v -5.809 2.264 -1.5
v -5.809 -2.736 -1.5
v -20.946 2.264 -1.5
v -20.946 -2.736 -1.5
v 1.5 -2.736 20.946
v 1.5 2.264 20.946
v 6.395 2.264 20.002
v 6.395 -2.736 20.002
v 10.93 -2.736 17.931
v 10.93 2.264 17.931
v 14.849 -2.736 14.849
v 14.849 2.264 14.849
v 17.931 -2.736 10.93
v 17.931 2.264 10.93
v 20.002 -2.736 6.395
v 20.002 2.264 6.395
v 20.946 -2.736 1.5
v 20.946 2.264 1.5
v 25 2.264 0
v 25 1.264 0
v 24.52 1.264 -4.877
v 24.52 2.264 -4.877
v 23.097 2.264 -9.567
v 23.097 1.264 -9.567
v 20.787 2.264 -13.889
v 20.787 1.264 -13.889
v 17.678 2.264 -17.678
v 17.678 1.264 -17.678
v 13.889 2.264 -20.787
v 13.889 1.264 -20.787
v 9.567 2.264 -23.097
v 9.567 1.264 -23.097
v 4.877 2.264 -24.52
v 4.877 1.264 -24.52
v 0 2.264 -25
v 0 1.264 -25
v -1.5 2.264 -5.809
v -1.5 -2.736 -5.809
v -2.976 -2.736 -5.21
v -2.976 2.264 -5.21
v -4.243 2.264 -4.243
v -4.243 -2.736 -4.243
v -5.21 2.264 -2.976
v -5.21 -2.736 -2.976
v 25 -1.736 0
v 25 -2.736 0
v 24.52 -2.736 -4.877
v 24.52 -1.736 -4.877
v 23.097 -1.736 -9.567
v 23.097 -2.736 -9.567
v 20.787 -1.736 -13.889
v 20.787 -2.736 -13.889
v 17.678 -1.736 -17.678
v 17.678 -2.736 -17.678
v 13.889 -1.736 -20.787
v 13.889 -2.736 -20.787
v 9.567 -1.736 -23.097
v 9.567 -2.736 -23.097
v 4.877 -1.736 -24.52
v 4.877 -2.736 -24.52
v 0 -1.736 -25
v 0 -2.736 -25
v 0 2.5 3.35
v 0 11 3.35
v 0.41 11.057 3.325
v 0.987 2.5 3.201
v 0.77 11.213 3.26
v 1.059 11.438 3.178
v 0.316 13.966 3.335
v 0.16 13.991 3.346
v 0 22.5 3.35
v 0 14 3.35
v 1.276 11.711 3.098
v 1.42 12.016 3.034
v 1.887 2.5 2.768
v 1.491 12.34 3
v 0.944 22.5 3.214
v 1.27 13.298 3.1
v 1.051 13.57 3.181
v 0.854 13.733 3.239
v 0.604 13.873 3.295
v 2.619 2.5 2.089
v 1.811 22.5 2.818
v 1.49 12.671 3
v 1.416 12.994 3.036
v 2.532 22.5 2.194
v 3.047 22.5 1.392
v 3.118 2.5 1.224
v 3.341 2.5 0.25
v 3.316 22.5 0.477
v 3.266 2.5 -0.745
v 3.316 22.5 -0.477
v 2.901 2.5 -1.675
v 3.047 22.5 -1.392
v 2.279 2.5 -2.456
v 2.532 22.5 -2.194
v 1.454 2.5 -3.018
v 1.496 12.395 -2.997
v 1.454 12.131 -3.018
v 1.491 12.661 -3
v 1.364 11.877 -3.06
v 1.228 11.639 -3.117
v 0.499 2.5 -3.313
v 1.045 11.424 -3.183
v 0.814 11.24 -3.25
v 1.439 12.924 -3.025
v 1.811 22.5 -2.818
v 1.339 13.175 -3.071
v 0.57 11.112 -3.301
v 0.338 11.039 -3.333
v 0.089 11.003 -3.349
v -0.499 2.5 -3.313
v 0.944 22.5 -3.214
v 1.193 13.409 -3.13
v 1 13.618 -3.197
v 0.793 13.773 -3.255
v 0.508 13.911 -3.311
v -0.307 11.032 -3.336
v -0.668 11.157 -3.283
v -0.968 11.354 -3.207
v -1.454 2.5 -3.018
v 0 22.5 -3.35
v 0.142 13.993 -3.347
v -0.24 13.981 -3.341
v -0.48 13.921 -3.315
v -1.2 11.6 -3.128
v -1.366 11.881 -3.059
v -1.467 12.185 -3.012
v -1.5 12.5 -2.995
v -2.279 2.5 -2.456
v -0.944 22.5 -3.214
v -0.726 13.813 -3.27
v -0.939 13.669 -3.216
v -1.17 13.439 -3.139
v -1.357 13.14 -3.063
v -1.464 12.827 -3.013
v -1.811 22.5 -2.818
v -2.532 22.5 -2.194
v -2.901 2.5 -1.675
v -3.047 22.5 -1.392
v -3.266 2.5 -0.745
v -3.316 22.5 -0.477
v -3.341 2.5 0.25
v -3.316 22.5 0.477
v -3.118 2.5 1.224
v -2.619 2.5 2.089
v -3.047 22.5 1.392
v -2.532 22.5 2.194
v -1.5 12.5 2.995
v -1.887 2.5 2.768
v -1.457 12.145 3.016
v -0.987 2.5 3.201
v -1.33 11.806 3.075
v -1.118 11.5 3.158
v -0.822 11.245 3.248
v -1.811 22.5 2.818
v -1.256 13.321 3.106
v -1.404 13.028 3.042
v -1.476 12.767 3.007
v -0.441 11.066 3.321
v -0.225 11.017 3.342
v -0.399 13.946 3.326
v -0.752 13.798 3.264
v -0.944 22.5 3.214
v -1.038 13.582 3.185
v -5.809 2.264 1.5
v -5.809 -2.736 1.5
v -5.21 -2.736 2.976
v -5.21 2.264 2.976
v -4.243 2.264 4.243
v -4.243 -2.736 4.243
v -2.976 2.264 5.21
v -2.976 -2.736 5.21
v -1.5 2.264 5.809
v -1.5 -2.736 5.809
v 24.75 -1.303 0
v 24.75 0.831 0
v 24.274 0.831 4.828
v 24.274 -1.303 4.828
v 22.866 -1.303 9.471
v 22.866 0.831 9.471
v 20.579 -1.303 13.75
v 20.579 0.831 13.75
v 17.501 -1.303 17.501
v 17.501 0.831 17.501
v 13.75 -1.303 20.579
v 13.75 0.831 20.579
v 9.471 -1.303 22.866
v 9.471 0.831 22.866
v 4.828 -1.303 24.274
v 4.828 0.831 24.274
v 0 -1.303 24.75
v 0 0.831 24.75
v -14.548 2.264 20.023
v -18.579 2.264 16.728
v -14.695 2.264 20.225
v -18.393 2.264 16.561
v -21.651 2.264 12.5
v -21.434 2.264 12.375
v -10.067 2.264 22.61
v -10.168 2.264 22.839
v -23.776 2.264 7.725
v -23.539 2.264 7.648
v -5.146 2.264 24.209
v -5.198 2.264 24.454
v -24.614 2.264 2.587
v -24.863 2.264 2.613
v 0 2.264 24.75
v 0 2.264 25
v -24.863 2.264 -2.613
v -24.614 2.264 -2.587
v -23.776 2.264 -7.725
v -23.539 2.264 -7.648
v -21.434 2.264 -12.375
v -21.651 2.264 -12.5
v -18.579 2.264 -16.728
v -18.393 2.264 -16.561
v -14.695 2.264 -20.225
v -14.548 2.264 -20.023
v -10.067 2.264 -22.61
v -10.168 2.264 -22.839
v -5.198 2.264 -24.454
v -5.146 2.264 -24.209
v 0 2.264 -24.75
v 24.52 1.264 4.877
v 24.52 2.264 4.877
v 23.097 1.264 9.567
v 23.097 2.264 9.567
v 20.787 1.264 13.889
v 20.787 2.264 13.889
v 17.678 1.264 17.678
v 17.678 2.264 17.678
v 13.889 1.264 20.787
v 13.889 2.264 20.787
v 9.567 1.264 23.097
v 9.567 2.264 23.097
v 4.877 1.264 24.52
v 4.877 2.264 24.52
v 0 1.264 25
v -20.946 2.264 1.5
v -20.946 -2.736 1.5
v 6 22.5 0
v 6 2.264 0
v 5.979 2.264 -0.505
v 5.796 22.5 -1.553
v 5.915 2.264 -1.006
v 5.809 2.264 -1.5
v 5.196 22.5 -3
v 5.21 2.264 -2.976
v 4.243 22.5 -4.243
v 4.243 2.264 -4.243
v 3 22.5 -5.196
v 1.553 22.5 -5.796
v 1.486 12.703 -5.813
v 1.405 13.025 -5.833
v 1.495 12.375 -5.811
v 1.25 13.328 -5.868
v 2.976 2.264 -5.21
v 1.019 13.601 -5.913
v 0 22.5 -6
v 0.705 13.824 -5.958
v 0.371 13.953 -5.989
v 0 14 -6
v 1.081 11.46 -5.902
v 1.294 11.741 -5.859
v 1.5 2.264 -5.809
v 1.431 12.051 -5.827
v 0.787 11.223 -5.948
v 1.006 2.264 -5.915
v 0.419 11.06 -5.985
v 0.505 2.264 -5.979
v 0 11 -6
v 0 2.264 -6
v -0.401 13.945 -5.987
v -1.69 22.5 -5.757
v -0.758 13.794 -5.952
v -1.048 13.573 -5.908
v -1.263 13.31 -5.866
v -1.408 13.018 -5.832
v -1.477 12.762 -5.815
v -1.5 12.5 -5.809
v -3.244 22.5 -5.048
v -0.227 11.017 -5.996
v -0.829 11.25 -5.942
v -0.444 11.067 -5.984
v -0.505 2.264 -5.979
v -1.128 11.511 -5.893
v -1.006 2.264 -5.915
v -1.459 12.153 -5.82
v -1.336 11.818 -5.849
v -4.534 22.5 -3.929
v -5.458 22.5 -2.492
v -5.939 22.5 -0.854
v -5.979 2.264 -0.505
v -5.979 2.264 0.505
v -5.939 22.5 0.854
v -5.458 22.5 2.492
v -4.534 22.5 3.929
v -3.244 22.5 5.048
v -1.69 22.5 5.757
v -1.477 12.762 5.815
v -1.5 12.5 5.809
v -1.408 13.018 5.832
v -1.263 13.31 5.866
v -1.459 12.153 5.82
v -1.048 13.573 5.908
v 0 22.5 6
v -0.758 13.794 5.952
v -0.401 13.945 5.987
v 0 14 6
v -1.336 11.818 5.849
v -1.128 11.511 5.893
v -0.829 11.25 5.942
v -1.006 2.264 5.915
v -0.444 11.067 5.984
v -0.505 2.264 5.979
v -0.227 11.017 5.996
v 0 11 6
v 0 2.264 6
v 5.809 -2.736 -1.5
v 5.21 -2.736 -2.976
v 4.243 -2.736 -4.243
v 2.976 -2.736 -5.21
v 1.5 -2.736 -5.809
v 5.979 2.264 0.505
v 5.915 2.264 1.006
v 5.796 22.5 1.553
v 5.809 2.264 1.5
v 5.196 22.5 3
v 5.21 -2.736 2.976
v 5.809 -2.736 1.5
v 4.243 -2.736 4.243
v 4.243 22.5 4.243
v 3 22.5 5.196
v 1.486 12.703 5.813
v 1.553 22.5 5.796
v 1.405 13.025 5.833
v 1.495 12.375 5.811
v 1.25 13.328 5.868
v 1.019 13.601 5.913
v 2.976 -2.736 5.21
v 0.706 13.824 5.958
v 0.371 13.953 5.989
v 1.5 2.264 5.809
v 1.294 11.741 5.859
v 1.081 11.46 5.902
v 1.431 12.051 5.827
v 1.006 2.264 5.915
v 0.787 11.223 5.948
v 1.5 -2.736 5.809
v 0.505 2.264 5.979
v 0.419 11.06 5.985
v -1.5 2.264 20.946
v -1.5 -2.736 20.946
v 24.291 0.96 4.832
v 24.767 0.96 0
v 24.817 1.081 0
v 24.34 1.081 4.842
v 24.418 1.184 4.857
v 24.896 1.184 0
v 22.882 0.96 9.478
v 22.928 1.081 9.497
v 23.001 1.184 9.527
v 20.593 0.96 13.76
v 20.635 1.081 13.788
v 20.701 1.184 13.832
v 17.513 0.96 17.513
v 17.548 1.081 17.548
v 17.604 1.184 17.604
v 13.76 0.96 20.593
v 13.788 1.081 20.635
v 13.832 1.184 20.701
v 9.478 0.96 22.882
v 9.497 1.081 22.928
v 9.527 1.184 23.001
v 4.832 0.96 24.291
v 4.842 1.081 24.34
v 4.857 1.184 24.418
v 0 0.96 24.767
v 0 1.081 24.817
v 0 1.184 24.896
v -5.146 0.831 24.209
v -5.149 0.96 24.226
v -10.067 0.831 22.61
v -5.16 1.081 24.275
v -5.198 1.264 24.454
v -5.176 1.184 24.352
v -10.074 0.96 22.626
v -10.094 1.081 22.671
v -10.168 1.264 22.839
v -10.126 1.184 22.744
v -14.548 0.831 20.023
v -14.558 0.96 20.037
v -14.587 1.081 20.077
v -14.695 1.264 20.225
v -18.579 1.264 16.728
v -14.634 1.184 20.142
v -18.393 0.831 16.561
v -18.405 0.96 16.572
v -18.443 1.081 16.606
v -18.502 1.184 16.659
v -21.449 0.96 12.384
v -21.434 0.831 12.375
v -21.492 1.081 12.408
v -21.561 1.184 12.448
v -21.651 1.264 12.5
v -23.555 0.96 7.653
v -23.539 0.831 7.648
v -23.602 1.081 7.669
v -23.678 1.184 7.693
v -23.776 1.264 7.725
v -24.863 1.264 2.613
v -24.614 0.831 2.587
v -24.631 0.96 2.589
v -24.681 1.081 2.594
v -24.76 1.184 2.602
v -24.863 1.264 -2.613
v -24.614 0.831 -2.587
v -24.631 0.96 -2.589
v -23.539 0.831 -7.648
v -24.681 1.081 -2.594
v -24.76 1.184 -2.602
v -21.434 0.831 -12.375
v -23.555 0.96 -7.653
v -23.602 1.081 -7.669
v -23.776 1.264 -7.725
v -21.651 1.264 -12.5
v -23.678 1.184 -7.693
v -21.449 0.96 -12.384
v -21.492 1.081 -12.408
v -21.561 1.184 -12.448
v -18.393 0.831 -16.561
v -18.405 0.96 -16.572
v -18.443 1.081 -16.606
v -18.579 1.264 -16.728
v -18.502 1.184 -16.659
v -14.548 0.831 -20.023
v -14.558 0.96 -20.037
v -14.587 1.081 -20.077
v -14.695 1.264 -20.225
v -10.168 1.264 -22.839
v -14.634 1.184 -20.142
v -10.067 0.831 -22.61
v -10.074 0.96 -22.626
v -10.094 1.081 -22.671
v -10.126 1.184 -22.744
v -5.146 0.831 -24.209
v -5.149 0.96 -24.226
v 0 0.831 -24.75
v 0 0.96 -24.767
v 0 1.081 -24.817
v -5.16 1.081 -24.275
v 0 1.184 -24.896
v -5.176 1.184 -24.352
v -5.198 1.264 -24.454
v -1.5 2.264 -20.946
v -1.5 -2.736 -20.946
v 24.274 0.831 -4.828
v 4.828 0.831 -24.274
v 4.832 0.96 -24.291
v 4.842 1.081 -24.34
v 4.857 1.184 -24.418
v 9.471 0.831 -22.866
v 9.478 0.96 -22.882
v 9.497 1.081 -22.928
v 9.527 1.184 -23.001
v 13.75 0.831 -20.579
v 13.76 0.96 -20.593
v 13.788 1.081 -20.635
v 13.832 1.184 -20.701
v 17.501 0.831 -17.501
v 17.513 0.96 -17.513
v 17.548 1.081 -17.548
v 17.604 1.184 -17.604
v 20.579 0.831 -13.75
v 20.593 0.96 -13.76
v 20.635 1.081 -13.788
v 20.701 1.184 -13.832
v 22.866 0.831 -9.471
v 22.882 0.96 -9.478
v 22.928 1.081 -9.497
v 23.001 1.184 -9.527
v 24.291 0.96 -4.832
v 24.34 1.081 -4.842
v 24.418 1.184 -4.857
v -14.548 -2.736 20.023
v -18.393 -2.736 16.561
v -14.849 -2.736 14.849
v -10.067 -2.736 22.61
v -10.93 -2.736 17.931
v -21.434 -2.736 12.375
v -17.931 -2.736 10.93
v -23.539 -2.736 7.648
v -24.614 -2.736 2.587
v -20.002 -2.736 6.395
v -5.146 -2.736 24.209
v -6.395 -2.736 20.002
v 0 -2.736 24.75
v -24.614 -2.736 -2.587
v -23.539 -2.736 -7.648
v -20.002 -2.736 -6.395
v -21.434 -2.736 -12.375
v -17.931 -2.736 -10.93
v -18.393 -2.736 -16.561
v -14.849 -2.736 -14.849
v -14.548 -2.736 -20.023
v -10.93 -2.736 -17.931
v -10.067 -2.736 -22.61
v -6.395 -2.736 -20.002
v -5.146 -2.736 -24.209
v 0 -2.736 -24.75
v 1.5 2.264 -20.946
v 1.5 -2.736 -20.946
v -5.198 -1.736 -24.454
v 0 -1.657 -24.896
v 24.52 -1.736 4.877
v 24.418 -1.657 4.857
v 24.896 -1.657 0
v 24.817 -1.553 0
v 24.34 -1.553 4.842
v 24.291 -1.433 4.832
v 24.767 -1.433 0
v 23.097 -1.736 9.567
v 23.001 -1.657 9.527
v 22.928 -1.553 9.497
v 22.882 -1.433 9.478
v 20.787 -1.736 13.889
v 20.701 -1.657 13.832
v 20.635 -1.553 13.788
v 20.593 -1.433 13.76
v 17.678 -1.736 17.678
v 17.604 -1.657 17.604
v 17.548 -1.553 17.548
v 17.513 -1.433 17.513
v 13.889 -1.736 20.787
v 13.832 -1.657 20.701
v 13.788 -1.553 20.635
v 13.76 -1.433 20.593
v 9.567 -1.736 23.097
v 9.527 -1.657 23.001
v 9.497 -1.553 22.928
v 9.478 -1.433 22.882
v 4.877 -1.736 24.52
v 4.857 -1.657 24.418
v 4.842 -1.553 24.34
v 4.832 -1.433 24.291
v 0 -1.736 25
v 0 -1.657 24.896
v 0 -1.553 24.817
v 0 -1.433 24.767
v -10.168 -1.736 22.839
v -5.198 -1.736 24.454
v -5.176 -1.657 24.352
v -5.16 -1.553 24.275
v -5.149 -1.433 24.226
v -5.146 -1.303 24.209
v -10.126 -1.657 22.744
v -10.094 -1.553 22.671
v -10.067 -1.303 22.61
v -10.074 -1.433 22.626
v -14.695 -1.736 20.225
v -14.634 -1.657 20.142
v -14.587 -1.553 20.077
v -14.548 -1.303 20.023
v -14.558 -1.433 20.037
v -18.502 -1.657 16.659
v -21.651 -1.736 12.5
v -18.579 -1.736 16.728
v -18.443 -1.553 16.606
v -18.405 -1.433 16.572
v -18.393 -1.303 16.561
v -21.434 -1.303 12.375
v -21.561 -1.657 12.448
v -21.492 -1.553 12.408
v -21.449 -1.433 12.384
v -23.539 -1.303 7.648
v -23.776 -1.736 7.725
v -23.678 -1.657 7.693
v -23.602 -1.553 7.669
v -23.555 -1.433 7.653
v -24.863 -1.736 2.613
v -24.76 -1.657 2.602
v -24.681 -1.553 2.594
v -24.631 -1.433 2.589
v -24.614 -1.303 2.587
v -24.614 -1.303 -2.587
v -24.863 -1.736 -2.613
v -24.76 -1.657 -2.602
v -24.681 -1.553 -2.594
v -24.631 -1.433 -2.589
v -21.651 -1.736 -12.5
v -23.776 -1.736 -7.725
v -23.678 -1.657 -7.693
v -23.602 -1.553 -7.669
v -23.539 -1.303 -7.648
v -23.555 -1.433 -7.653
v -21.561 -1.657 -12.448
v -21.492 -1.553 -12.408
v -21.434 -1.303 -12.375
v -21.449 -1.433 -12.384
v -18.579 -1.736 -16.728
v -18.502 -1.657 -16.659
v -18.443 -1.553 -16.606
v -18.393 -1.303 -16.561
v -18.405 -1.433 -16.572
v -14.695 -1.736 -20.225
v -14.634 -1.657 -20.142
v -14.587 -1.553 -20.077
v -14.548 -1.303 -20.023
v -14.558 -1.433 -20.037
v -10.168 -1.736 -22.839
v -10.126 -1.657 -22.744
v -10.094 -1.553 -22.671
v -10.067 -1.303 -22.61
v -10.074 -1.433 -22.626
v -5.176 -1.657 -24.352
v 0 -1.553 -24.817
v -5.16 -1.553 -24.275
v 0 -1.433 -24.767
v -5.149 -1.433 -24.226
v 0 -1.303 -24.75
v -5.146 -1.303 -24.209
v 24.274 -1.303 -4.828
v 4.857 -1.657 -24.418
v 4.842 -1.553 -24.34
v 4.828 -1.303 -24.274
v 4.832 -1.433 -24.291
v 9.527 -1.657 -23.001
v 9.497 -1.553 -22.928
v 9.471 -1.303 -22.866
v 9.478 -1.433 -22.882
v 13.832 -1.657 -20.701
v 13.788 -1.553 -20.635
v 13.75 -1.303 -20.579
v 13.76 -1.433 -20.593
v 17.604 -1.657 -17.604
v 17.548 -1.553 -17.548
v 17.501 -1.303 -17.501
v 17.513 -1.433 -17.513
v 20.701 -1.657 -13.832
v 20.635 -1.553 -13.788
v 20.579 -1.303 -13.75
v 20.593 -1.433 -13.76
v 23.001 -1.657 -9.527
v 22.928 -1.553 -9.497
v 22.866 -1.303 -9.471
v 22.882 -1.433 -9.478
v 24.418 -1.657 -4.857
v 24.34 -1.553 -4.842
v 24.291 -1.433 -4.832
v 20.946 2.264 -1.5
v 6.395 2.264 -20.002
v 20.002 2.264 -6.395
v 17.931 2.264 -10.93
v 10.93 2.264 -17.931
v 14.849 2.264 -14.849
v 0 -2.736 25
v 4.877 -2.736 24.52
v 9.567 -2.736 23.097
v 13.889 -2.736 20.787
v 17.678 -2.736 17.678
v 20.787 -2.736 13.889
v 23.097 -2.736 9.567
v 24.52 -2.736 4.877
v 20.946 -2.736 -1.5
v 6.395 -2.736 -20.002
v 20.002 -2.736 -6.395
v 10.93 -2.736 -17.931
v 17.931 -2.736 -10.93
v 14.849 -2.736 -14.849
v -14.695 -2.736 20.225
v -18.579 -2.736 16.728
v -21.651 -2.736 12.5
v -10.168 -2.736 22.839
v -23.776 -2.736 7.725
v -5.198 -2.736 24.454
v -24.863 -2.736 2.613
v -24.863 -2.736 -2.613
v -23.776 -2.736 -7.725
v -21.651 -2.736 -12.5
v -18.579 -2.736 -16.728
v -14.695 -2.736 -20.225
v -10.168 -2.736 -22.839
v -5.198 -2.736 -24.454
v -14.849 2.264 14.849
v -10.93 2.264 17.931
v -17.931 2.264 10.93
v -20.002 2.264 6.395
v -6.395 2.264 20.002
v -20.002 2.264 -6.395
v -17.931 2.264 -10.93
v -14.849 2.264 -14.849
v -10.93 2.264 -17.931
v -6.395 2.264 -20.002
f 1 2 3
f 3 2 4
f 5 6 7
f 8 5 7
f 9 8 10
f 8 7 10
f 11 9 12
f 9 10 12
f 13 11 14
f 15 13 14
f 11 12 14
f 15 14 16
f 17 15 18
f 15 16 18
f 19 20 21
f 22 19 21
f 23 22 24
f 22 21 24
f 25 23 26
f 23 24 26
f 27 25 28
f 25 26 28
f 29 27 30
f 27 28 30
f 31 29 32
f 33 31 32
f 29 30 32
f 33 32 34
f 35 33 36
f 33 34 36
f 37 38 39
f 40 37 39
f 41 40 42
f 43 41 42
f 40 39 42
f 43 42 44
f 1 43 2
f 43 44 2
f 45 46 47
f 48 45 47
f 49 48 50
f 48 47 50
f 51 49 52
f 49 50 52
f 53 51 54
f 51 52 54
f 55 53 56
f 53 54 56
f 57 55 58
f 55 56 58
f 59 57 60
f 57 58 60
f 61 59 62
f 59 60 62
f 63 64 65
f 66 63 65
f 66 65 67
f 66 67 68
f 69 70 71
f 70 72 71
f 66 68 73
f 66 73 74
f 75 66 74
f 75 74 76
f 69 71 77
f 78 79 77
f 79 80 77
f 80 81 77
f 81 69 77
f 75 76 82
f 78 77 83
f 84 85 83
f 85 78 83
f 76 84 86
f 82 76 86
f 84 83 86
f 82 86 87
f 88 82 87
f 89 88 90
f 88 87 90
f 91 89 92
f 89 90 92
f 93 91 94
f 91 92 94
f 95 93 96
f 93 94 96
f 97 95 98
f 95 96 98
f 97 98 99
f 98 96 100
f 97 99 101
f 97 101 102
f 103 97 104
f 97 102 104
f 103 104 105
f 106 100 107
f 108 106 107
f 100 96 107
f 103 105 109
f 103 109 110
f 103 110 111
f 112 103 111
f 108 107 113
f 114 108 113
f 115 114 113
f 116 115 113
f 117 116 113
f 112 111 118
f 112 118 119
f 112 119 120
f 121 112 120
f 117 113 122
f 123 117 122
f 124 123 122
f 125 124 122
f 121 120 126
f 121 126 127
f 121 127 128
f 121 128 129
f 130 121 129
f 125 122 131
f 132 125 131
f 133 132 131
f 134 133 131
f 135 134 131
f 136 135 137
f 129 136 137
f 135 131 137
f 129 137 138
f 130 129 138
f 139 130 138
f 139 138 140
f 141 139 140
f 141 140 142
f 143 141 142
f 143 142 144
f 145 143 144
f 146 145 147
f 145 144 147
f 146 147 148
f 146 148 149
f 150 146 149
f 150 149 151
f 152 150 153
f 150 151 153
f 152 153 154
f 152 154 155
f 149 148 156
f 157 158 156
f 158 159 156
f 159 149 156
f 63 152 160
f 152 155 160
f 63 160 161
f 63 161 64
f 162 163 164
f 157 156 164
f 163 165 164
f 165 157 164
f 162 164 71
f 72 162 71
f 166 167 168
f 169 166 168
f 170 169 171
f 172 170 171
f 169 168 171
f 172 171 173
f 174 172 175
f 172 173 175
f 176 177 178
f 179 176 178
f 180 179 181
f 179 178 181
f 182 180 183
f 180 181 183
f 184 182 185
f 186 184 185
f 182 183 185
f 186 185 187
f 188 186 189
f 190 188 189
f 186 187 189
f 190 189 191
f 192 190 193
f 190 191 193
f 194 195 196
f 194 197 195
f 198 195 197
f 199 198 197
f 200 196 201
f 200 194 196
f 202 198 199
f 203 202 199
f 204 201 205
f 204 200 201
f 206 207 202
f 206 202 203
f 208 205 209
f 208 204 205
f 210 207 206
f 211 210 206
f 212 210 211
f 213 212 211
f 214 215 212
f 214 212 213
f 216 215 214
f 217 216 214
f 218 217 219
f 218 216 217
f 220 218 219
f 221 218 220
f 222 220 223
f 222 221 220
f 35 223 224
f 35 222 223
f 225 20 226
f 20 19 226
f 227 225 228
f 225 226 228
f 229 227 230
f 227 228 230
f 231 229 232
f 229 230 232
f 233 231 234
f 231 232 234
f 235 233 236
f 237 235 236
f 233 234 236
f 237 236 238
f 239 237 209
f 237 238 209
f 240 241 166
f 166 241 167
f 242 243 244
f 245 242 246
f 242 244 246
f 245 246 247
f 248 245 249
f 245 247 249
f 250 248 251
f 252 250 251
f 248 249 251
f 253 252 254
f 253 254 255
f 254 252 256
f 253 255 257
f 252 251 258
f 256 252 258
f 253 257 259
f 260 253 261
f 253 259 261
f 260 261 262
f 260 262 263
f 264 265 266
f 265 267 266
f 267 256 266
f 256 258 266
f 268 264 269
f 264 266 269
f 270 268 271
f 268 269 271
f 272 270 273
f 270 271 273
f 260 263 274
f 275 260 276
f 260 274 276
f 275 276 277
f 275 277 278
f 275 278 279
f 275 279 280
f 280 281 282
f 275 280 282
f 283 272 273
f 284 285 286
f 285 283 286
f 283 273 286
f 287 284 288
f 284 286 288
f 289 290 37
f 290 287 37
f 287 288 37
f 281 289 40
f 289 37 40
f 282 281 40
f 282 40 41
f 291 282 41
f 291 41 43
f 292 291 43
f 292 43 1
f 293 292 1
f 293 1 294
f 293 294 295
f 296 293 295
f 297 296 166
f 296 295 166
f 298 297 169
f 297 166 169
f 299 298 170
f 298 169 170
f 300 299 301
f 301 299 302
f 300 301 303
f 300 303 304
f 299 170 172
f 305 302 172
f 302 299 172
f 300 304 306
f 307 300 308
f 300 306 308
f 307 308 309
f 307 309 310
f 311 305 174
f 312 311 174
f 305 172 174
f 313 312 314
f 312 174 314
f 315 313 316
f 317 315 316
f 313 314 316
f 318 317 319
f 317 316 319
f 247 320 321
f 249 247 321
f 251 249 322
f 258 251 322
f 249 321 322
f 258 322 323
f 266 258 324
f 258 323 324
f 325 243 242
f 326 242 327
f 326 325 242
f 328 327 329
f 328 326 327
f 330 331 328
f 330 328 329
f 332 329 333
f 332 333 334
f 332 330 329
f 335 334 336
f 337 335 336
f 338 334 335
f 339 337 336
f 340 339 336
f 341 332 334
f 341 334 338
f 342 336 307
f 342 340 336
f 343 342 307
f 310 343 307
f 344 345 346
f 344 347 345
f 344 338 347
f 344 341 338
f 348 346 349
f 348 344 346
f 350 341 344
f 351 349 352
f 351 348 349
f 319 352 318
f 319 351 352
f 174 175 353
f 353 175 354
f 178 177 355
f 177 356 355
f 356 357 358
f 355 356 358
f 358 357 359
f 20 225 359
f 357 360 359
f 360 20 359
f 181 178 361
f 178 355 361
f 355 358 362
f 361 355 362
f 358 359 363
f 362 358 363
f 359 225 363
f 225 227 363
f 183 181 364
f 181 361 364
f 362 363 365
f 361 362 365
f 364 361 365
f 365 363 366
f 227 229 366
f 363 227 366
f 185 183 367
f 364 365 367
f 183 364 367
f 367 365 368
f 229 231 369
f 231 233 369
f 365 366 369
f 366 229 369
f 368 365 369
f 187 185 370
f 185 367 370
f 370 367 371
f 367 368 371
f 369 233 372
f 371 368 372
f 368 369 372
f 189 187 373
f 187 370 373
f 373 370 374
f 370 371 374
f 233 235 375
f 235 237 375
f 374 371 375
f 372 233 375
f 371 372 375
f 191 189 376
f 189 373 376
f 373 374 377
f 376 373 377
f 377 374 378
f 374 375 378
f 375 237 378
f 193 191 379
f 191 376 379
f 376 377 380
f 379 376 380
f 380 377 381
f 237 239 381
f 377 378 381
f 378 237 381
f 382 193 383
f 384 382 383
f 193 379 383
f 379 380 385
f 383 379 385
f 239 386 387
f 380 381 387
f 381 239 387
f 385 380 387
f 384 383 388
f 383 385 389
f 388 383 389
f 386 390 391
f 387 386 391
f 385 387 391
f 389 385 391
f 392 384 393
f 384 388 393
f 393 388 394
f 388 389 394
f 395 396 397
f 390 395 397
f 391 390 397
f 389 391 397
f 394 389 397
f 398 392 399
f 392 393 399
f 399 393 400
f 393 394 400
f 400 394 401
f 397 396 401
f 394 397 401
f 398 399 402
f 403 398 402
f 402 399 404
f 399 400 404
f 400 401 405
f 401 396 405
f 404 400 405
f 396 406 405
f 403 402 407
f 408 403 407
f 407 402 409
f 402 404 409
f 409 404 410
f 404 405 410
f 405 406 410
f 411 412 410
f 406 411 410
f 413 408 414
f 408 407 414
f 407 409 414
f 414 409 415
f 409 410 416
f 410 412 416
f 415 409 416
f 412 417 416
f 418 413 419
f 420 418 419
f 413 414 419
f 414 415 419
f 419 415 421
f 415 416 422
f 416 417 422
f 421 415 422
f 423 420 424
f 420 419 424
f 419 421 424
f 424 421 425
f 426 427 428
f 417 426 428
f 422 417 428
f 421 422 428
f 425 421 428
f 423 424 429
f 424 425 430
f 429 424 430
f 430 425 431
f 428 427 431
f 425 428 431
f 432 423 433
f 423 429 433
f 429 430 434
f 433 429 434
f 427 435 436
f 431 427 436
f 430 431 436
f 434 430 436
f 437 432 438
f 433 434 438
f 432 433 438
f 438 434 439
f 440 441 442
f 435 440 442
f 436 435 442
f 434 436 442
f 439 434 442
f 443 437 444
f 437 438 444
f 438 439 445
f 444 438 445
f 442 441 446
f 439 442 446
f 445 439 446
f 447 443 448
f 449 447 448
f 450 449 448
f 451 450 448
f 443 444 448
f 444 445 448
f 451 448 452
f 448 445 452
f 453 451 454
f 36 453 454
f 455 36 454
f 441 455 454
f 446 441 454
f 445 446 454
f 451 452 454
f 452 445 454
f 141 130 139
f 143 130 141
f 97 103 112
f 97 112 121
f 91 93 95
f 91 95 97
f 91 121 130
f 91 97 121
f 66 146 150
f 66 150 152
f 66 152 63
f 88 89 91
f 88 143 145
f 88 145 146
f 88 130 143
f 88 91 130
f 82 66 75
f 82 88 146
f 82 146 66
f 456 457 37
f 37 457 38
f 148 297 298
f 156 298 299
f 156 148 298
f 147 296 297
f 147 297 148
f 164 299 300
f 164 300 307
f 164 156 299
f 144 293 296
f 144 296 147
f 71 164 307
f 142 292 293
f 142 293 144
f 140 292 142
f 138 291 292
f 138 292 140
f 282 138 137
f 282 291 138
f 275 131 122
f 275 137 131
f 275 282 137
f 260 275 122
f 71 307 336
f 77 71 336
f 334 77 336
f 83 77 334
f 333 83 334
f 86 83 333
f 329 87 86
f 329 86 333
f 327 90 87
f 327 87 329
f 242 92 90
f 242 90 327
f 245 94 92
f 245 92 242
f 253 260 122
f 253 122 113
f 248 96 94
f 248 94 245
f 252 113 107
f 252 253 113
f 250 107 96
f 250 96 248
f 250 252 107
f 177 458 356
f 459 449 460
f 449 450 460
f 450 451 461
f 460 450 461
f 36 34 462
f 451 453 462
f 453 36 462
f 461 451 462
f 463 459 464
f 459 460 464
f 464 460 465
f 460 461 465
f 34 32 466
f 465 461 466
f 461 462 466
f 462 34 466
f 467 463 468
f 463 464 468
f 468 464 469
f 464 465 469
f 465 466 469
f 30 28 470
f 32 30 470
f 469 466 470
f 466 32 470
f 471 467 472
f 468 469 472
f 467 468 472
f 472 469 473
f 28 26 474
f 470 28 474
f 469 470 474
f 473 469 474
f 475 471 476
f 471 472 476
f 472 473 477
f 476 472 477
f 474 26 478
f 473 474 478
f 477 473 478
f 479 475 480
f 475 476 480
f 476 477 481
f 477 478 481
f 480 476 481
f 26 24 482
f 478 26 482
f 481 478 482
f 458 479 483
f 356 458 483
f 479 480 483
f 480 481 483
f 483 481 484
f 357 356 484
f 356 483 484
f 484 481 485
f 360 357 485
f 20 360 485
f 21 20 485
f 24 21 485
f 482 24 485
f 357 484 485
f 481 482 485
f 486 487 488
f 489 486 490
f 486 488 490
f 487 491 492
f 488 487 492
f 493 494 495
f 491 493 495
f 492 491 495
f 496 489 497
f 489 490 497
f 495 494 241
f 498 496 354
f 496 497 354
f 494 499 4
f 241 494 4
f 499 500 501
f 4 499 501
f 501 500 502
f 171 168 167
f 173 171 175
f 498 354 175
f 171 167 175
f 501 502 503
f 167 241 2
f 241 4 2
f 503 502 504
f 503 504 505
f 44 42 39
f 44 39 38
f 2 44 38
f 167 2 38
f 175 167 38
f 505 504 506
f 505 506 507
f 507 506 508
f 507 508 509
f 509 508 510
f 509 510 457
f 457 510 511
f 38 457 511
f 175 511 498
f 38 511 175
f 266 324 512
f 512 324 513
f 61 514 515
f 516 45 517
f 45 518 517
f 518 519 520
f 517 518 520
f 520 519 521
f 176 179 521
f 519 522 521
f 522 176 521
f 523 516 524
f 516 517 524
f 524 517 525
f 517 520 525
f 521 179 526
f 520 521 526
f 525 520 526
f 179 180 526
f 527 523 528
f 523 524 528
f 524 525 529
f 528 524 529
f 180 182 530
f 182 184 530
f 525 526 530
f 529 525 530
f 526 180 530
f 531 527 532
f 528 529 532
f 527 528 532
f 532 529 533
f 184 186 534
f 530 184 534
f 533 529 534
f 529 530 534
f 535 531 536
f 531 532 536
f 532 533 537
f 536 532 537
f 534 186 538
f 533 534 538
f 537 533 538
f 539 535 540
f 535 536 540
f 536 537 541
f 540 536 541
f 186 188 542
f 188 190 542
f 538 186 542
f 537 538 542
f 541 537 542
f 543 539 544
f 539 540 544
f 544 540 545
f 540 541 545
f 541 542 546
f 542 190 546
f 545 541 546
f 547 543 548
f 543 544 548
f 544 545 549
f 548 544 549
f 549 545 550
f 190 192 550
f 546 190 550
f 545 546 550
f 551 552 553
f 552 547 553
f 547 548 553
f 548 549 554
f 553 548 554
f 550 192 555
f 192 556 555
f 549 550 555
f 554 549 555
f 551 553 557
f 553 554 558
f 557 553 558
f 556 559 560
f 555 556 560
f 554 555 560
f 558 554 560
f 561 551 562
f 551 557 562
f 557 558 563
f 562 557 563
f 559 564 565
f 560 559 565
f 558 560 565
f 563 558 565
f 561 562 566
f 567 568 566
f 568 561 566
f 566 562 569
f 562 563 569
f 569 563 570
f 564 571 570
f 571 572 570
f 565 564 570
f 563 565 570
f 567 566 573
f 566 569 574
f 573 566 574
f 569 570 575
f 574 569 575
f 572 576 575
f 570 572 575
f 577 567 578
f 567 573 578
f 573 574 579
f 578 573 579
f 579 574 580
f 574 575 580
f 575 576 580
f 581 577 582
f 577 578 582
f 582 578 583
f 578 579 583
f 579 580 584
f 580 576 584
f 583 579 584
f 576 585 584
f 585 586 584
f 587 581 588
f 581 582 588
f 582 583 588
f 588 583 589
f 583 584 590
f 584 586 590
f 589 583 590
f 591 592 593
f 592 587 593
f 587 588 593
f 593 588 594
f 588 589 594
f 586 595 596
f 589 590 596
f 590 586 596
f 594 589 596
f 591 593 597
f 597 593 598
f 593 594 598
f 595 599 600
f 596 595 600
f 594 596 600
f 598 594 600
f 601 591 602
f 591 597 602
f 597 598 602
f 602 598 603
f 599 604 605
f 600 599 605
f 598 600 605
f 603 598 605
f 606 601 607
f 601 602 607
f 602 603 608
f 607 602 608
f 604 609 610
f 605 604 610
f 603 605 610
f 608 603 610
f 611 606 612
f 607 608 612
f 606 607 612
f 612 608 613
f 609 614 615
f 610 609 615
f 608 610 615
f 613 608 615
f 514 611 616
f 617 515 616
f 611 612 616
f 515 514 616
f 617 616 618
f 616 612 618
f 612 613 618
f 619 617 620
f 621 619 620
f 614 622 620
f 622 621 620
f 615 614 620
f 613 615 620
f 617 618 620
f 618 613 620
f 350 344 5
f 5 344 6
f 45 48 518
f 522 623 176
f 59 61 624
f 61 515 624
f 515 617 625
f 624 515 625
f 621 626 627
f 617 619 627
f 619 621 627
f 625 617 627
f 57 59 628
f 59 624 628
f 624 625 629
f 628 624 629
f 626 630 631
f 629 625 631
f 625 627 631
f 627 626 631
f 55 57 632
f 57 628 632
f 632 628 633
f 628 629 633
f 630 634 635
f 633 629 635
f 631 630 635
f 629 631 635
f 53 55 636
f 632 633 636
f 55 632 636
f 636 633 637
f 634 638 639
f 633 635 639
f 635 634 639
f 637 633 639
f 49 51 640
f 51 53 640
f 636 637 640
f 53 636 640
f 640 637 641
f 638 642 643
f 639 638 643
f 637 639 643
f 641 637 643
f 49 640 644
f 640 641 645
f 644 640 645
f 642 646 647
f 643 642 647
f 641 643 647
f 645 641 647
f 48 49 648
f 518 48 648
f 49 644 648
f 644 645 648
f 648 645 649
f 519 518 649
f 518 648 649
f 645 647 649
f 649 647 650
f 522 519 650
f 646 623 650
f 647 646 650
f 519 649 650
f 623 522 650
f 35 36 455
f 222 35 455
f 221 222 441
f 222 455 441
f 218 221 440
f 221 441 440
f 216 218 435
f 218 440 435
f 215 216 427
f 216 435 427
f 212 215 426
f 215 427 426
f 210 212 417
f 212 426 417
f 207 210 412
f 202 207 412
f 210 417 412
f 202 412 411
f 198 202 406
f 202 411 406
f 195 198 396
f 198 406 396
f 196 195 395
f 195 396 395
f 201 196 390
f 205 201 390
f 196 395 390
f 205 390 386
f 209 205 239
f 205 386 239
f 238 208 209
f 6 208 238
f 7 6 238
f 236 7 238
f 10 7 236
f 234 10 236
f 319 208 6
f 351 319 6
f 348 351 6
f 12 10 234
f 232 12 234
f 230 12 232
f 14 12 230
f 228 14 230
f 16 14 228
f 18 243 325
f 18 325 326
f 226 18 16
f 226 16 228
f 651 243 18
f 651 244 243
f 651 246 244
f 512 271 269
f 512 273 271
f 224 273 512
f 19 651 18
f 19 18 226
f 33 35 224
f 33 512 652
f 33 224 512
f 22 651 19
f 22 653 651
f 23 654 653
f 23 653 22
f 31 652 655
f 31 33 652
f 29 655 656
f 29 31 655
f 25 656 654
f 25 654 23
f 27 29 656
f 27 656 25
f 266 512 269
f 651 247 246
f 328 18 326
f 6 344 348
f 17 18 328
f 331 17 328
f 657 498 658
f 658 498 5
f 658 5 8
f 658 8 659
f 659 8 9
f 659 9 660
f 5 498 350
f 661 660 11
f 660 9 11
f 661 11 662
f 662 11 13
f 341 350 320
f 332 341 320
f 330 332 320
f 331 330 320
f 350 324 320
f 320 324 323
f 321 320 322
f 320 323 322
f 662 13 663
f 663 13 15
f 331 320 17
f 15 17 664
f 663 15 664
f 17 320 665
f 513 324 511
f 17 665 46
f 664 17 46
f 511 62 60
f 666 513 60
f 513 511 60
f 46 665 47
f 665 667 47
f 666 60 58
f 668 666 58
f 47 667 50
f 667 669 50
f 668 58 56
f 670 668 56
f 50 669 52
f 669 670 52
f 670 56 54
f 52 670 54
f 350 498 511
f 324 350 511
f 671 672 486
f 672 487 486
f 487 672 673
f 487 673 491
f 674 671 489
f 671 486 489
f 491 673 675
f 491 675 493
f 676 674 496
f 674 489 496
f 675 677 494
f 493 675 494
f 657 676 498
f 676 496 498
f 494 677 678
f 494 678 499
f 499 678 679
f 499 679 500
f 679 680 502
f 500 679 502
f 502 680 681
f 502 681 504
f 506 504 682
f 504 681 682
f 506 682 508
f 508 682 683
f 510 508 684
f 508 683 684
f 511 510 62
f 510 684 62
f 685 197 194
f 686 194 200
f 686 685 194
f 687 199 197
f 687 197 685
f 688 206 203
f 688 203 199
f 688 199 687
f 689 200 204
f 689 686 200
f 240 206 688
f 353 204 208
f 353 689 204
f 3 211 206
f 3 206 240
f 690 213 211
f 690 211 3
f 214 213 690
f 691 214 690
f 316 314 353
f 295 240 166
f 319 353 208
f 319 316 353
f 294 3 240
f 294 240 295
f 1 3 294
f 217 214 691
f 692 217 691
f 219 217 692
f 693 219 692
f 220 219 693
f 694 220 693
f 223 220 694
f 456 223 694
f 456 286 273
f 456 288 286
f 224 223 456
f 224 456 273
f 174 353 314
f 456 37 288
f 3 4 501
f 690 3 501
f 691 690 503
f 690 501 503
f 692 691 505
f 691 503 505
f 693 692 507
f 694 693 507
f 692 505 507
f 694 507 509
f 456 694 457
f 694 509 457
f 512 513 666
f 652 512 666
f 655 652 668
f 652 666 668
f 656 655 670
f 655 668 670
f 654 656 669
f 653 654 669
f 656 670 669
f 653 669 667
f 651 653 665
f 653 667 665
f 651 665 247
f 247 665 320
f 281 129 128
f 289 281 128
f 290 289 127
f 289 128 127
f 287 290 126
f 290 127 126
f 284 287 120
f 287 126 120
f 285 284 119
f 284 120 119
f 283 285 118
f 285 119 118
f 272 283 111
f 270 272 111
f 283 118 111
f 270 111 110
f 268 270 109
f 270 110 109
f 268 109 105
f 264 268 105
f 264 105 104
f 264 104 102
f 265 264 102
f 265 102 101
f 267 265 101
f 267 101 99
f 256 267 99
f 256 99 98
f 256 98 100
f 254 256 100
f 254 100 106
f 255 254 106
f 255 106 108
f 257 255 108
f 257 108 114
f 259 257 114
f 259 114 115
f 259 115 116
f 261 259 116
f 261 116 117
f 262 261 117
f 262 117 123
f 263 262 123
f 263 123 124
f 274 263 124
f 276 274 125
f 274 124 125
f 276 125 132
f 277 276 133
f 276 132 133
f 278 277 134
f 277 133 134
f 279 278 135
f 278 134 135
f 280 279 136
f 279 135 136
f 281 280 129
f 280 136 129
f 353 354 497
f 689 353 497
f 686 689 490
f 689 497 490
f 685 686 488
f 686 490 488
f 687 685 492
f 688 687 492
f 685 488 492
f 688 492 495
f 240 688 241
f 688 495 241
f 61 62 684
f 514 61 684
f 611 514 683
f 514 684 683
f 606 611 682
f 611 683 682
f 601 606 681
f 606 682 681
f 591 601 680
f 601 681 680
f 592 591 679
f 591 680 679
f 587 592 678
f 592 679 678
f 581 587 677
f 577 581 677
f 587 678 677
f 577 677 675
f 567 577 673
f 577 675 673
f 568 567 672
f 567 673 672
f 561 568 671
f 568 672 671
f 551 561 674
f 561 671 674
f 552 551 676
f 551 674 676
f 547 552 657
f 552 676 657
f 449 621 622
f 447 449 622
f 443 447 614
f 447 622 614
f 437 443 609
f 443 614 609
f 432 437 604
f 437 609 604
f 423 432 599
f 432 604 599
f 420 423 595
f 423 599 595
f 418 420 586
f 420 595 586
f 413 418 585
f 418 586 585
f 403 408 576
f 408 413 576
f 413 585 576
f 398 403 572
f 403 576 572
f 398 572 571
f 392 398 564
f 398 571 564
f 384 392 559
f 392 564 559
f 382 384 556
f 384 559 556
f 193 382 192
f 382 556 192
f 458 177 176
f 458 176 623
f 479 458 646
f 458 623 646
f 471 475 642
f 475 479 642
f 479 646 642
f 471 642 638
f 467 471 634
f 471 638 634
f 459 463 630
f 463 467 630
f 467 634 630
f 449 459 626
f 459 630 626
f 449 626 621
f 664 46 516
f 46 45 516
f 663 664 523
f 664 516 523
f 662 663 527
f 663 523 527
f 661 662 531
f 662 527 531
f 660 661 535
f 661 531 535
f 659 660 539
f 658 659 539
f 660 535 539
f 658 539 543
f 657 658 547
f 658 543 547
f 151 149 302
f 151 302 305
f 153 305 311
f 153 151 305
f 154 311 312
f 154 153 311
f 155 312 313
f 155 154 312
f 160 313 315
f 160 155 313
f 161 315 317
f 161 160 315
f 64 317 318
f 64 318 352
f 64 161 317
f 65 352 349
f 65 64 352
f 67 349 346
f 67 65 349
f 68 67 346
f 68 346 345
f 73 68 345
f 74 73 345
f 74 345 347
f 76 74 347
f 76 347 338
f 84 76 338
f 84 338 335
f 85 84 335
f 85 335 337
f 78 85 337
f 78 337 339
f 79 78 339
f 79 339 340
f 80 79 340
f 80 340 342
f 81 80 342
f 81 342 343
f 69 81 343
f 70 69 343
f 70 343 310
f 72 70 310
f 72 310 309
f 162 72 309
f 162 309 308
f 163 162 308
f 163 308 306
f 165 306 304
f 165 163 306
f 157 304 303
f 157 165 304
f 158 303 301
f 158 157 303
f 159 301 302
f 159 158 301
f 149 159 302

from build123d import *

# Parameters (mm, degrees)
REVOLVE1_ANGLE                 = 90.0000000000002
BOSS_EXTRUDE2_DEPTH            = 22.5
CUT_EXTRUDE1_DEPTH             = 41.736973886583954
MIRROR3_START                  = -2.736132077
MIRROR3_DEPTH                  = 5
MIRROR3_START_2                = 2.263867923
MIRROR3_2_DEPTH                = 20.236132077
MIRROR3_3_DEPTH                = 1
MIRROR3_START_3                = 1.263867923
MIRROR3_4_DEPTH                = 1
MIRROR4_START                  = -2.736132077
MIRROR4_DEPTH                  = 5
MIRROR4_START_2                = 2.263867923
MIRROR4_2_DEPTH                = 20.236132077
MIRROR4_3_DEPTH                = 1
MIRROR4_START_3                = 1.263867923
MIRROR4_4_DEPTH                = 1
SKETCH7_R                      = 3.35
CUT_EXTRUDE2_DEPTH             = 20
FILLET9_R                      = 0.5
CUT_EXTRUDE3_REACH             = 43.908
SKETCH8_R                      = 1.5000000000000004
CUT_EXTRUDE3_DIRECTION_2_REACH = 43.908


# Read off the part's stored shape, not the designer's step: Mirror3, Mirror4
with BuildPart() as part:
    # Sketch1 → Revolve1 (revolve)
    with BuildSketch(Plane.XY):
        Polygon((0, 2.2638679230386933), (0, -2.7361320769613027), (25, -2.7361320769613027), (25.000000000000007, -1.736132076961303), (24.750000000000007, -1.736132076961303), (24.75, 1.2638679230386973), (25, 1.2638679230386973), (25, 2.2638679230386973), align=None)
    revolve(axis=Axis((0, 2.2638679230386933, 0), (0, -1, 0)), revolution_arc=REVOLVE1_ANGLE)

    # Sketch2 → Boss-Extrude2 (add)
    with BuildSketch(Plane(origin=(0, 0, 0), x_dir=(1, 0, 0), z_dir=(0, 1, 0))):
        with BuildLine():
            Line((0, 0), (6, 0))
            ThreePointArc((6, 0), (4.242640687119239, -4.242640687119332), (-1.3093e-13, -6))
            Line((-1.3093e-13, -6), (0, 0))
        make_face()
    extrude(amount=BOSS_EXTRUDE2_DEPTH)

    # Sketch6 → Cut-Extrude1 (cut, through all)
    with BuildSketch(Plane(origin=(0, 2.263867923038695, 0), x_dir=(1, 0, 0), z_dir=(0, 1, 0))):
        with BuildLine():
            Line((1.4999999999999127, -5.809475019311148), (1.4999999999999145, -20.946360065653423))
            ThreePointArc((1.4999999999999145, -20.946360065653423), (14.849242404917469, -14.849242404917533), (20.946360065653415, -1.5))
            Line((20.946360065653415, -1.5), (5.809475019311125, -1.5))
            ThreePointArc((5.809475019311125, -1.5), (4.242640687119254, -4.242640687119317), (1.4999999999999127, -5.809475019311148))
        make_face()
    extrude(amount=-CUT_EXTRUDE1_DEPTH, mode=Mode.SUBTRACT)

    # Mirror3 outline → Mirror3 (add)
    with BuildSketch(Plane(origin=(0, 0, 0), x_dir=(1, 0, 0), z_dir=(0, 1, 0)).offset(MIRROR3_START)):
        with BuildLine():
            ThreePointArc((24.75, 0), (17.500892834, 17.500892834), (0, 24.75))
            Line((0, 24.75), (0, 0))
            Line((0, 0), (24.75, 0))
        make_face()
        with BuildLine():
            Line((20.946360066, 1.5), (5.809475019, 1.5))
            ThreePointArc((5.809475019, 1.5), (4.242640687, 4.242640687), (1.5, 5.809475019))
            Line((1.5, 5.809475019), (1.5, 20.946360066))
            ThreePointArc((1.5, 20.946360066), (14.849242405, 14.849242405), (20.946360066, 1.5))
        make_face(mode=Mode.SUBTRACT)
    extrude(amount=MIRROR3_DEPTH)

    # Mirror3 2 outline → Mirror3 2 (add)
    with BuildSketch(Plane(origin=(0, 0, 0), x_dir=(1, 0, 0), z_dir=(0, 1, 0)).offset(MIRROR3_START_2)):
        with BuildLine():
            Line((0, 0), (6, 0))
            ThreePointArc((6, 0), (4.242640687, 4.242640687), (0, 6))
            Line((0, 6), (0, 0))
        make_face()
    extrude(amount=MIRROR3_2_DEPTH)

    # Mirror3 3 outline → Mirror3 3 (add)
    with BuildSketch(Plane(origin=(0, 0, 0), x_dir=(1, 0, 0), z_dir=(0, 1, 0)).offset(MIRROR3_START)):
        with BuildLine():
            Line((24.75, 0), (25, 0))
            ThreePointArc((25, 0), (17.67766953, 17.67766953), (0, 25))
            Line((0, 25), (0, 24.75))
            ThreePointArc((0, 24.75), (17.500892834, 17.500892834), (24.75, 0))
        make_face()
    extrude(amount=MIRROR3_3_DEPTH)

    # Mirror3 4 outline → Mirror3 4 (add)
    with BuildSketch(Plane(origin=(0, 0, 0), x_dir=(1, 0, 0), z_dir=(0, 1, 0)).offset(MIRROR3_START_3)):
        with BuildLine():
            Line((24.75, 0), (25, 0))
            ThreePointArc((25, 0), (17.67766953, 17.67766953), (0, 25))
            Line((0, 25), (0, 24.75))
            ThreePointArc((0, 24.75), (17.500892834, 17.500892834), (24.75, 0))
        make_face()
    extrude(amount=MIRROR3_4_DEPTH)

    # Mirror4 outline → Mirror4 (add)
    with BuildSketch(Plane(origin=(0, 0, 0), x_dir=(1, 0, 0), z_dir=(0, 1, 0)).offset(MIRROR4_START)):
        with BuildLine():
            ThreePointArc((0, 24.75), (-24.75, 0), (0, -24.75))
            Line((0, -24.75), (0, 24.75))
        make_face()
        with BuildLine():
            Line((-1.5, 20.946360066), (-1.5, 5.809475019))
            ThreePointArc((-1.5, 5.809475019), (-4.242640687, 4.242640687), (-5.809475019, 1.5))
            Line((-5.809475019, 1.5), (-20.946360066, 1.5))
            ThreePointArc((-20.946360066, 1.5), (-14.849242405, 14.849242405), (-1.5, 20.946360066))
        make_face(mode=Mode.SUBTRACT)
        with BuildLine():
            Line((-20.946360066, -1.5), (-5.809475019, -1.5))
            ThreePointArc((-5.809475019, -1.5), (-4.242640687, -4.242640687), (-1.5, -5.809475019))
            Line((-1.5, -5.809475019), (-1.5, -20.946360066))
            ThreePointArc((-1.5, -20.946360066), (-14.849242405, -14.849242405), (-20.946360066, -1.5))
        make_face(mode=Mode.SUBTRACT)
    extrude(amount=MIRROR4_DEPTH)

    # Mirror4 2 outline → Mirror4 2 (add)
    with BuildSketch(Plane(origin=(0, 0, 0), x_dir=(1, 0, 0), z_dir=(0, 1, 0)).offset(MIRROR4_START_2)):
        with BuildLine():
            Line((0, -6), (0, 6))
            ThreePointArc((0, 6), (-6, 0), (0, -6))
        make_face()
    extrude(amount=MIRROR4_2_DEPTH)

    # Mirror4 3 outline → Mirror4 3 (add)
    with BuildSketch(Plane(origin=(0, 0, 0), x_dir=(1, 0, 0), z_dir=(0, 1, 0)).offset(MIRROR4_START)):
        with BuildLine():
            Line((0, 24.75), (0, 25))
            ThreePointArc((0, 25), (-25, 0), (0, -25))
            Line((0, -25), (0, -24.75))
            ThreePointArc((0, -24.75), (-24.75, 0), (0, 24.75))
        make_face()
    extrude(amount=MIRROR4_3_DEPTH)

    # Mirror4 4 outline → Mirror4 4 (add)
    with BuildSketch(Plane(origin=(0, 0, 0), x_dir=(1, 0, 0), z_dir=(0, 1, 0)).offset(MIRROR4_START_3)):
        with BuildLine():
            Line((0, 24.75), (0, 25))
            ThreePointArc((0, 25), (-25, 0), (0, -25))
            Line((0, -25), (0, -24.75))
            ThreePointArc((0, -24.75), (-24.75, 0), (0, 24.75))
        make_face()
    extrude(amount=MIRROR4_4_DEPTH)

    # Sketch7 → Cut-Extrude2 (cut)
    with BuildSketch(Plane(origin=(0, 22.5, 0), x_dir=(1, 0, 0), z_dir=(0, 1, 0))):
        with Locations(Location((0, 0, 0), (0, 0, 270))):
            Circle(SKETCH7_R)
    extrude(amount=-CUT_EXTRUDE2_DEPTH, mode=Mode.SUBTRACT)

    # Fillet9
    # the kernel refuses this fillet: 0.5 mm, written as the material it adds along each edge
    with BuildSketch(Plane(origin=(3.55e-15, 1.263867923, 0), x_dir=(-1.4e-16, 0, 1), z_dir=(1, 0, 1.4e-16))) as fillet9_piece_1:
        with BuildLine():
            CenterArc((25.25, 0.4330127018922456), FILLET9_R, 180, 60.000000000001876)
            Line((25.000000000000014, 1.821e-14), (24.995000000000015, -0.00866025403782644))
            ThreePointArc((24.995000000000015, -0.00866025403782644), (24.875000000000007, -0.01000000000000001), (24.75, -0.01000000000000001))
            Line((24.75, -0.01000000000000001), (24.74, 0))
            Line((24.74, 0), (24.74, 0.4330127018922456))
            Line((24.74, 0.4330127018922456), (24.75, 0.4330127018922456))
        make_face()
    revolve(axis=Axis((3.55e-15, 1.263867923, 0), (0, -1, 0)), revolution_arc=179.99999999999997)
    with BuildSketch(Plane(origin=(3.55e-15, -1.7361320770000002, 0), x_dir=(-1.4e-16, 0, 1), z_dir=(1, 0, 1.4e-16))) as fillet9_piece_2:
        with BuildLine():
            CenterArc((25.25, -0.4330127018922456), FILLET9_R, 119.99999999999814, 60.00000000000186)
            Line((24.75, -0.4330127018922456), (24.74, -0.4330127018922456))
            Line((24.74, -0.4330127018922456), (24.74, 0))
            Line((24.74, 0), (24.75, 0.01000000000000001))
            ThreePointArc((24.75, 0.01000000000000001), (24.875000000000007, 0.01000000000000001), (24.995000000000015, 0.00866025403782644))
            Line((24.995000000000015, 0.00866025403782644), (25.000000000000014, -1.821e-14))
        make_face()
    revolve(axis=Axis((3.55e-15, -1.7361320770000002, 0), (0, -1, 0)), revolution_arc=179.99999999999997)
    with BuildSketch(Plane(origin=(0, -1.7361320769613031, 0), x_dir=(1, 0, 0), z_dir=(0, 0, -1))) as fillet9_piece_3:
        with BuildLine():
            CenterArc((25.250000000000007, -0.4330127018922436), FILLET9_R, 119.9999999999986, 60.00000000000141)
            Line((24.750000000000007, -0.4330127018922436), (24.740000000000006, -0.4330127018922436))
            Line((24.740000000000006, -0.4330127018922436), (24.740000000000006, 0))
            Line((24.740000000000006, 0), (24.750000000000007, 0.01000000000000001))
            ThreePointArc((24.750000000000007, 0.01000000000000001), (24.875000000000014, 0.01000000000000001), (24.99500000000002, 0.00866025403782622))
            Line((24.99500000000002, 0.00866025403782622), (25.000000000000018, -1.821e-14))
        make_face()
    revolve(axis=Axis((0, -1.7361320769613031, 0), (0, -1, 0)), revolution_arc=90.0000000000002)
    with BuildSketch(Plane(origin=(-1.25320021e-09, -1.7361320770000002, 1.25320021e-09), x_dir=(5.063435192760357e-11, 0, -1.0), z_dir=(-1.0, 0, -5.063435192760357e-11))) as fillet9_piece_4:
        with BuildLine():
            CenterArc((25.2500000012532, -0.4330127018922456), FILLET9_R, 119.99999999999814, 60.00000000000186)
            Line((24.7500000012532, -0.4330127018922456), (24.7400000012532, -0.4330127018922456))
            Line((24.7400000012532, -0.4330127018922456), (24.7400000012532, 0))
            Line((24.7400000012532, 0), (24.7500000012532, 0.01000000000000001))
            ThreePointArc((24.7500000012532, 0.01000000000000001), (24.875000001253206, 0.01000000000000001), (24.995000001253217, 0.00866025403782644))
            Line((24.995000001253217, 0.00866025403782644), (25.000000001253213, -1.821e-14))
        make_face()
    revolve(axis=Axis((-1.25320021e-09, -1.7361320770000002, 1.25320021e-09), (0, -1, 0)), revolution_arc=89.99999999419774)
    with BuildSketch(Plane(origin=(0, 1.2638679230386973, 0), x_dir=(1, 0, 0), z_dir=(0, 0, -1))) as fillet9_piece_5:
        with BuildLine():
            CenterArc((25.250000000000007, 0.4330127018922396), FILLET9_R, 180, 60.000000000000455)
            Line((25.00000000000001, 1.821e-14), (24.99500000000001, -0.00866025403782622))
            ThreePointArc((24.99500000000001, -0.00866025403782622), (24.875000000000007, -0.01000000000000001), (24.75, -0.01000000000000001))
            Line((24.75, -0.01000000000000001), (24.74, 0))
            Line((24.74, 0), (24.740000000000006, 0.4330127018922396))
            Line((24.740000000000006, 0.4330127018922396), (24.750000000000007, 0.4330127018922396))
        make_face()
    revolve(axis=Axis((0, 1.2638679230386973, 0), (0, -1, 0)), revolution_arc=90.0000000000002)
    with BuildSketch(Plane(origin=(-1.25320021e-09, 1.263867923, 1.25320021e-09), x_dir=(5.063435192760357e-11, 0, -1.0), z_dir=(-1.0, 0, -5.063435192760357e-11))) as fillet9_piece_6:
        with BuildLine():
            CenterArc((25.2500000012532, 0.4330127018922456), FILLET9_R, 180, 60.000000000001876)
            Line((25.000000001253213, 1.821e-14), (24.995000001253217, -0.00866025403782644))
            ThreePointArc((24.995000001253217, -0.00866025403782644), (24.875000001253206, -0.01000000000000001), (24.7500000012532, -0.01000000000000001))
            Line((24.7500000012532, -0.01000000000000001), (24.7400000012532, 0))
            Line((24.7400000012532, 0), (24.7400000012532, 0.4330127018922456))
            Line((24.7400000012532, 0.4330127018922456), (24.7500000012532, 0.4330127018922456))
        make_face()
    revolve(axis=Axis((-1.25320021e-09, 1.263867923, 1.25320021e-09), (0, -1, 0)), revolution_arc=89.99999999419774)

    # Sketch8 → Cut-Extrude3 (cut, up to next)
    with BuildSketch(Plane.XY, mode=Mode.PRIVATE) as cut_extrude3_sk1:
        with Locations(Location((1.22e-15, 12.499999999999998, 0), (0, 0, 180))):
            Circle(SKETCH8_R)
    cut_extrude3_tool1 = extrude(cut_extrude3_sk1.sketch, amount=CUT_EXTRUDE3_REACH, mode=Mode.PRIVATE) & part.part
    add(cut_extrude3_tool1.solids().sort_by_distance((0, 12.5, 0))[0], mode=Mode.SUBTRACT)

    # Sketch8 → Cut-Extrude3 direction 2 (cut, up to next)
    with BuildSketch(Plane.XY, mode=Mode.PRIVATE) as cut_extrude3_direction_2_sk1:
        with Locations(Location((1.22e-15, 12.499999999999998, 0), (0, 0, 180))):
            Circle(SKETCH8_R)
    cut_extrude3_direction_2_tool1 = extrude(cut_extrude3_direction_2_sk1.sketch, amount=-CUT_EXTRUDE3_DIRECTION_2_REACH, mode=Mode.PRIVATE) & part.part
    add(cut_extrude3_direction_2_tool1.solids().sort_by_distance((0, 12.5, 0))[0], mode=Mode.SUBTRACT)


solid = part.part
